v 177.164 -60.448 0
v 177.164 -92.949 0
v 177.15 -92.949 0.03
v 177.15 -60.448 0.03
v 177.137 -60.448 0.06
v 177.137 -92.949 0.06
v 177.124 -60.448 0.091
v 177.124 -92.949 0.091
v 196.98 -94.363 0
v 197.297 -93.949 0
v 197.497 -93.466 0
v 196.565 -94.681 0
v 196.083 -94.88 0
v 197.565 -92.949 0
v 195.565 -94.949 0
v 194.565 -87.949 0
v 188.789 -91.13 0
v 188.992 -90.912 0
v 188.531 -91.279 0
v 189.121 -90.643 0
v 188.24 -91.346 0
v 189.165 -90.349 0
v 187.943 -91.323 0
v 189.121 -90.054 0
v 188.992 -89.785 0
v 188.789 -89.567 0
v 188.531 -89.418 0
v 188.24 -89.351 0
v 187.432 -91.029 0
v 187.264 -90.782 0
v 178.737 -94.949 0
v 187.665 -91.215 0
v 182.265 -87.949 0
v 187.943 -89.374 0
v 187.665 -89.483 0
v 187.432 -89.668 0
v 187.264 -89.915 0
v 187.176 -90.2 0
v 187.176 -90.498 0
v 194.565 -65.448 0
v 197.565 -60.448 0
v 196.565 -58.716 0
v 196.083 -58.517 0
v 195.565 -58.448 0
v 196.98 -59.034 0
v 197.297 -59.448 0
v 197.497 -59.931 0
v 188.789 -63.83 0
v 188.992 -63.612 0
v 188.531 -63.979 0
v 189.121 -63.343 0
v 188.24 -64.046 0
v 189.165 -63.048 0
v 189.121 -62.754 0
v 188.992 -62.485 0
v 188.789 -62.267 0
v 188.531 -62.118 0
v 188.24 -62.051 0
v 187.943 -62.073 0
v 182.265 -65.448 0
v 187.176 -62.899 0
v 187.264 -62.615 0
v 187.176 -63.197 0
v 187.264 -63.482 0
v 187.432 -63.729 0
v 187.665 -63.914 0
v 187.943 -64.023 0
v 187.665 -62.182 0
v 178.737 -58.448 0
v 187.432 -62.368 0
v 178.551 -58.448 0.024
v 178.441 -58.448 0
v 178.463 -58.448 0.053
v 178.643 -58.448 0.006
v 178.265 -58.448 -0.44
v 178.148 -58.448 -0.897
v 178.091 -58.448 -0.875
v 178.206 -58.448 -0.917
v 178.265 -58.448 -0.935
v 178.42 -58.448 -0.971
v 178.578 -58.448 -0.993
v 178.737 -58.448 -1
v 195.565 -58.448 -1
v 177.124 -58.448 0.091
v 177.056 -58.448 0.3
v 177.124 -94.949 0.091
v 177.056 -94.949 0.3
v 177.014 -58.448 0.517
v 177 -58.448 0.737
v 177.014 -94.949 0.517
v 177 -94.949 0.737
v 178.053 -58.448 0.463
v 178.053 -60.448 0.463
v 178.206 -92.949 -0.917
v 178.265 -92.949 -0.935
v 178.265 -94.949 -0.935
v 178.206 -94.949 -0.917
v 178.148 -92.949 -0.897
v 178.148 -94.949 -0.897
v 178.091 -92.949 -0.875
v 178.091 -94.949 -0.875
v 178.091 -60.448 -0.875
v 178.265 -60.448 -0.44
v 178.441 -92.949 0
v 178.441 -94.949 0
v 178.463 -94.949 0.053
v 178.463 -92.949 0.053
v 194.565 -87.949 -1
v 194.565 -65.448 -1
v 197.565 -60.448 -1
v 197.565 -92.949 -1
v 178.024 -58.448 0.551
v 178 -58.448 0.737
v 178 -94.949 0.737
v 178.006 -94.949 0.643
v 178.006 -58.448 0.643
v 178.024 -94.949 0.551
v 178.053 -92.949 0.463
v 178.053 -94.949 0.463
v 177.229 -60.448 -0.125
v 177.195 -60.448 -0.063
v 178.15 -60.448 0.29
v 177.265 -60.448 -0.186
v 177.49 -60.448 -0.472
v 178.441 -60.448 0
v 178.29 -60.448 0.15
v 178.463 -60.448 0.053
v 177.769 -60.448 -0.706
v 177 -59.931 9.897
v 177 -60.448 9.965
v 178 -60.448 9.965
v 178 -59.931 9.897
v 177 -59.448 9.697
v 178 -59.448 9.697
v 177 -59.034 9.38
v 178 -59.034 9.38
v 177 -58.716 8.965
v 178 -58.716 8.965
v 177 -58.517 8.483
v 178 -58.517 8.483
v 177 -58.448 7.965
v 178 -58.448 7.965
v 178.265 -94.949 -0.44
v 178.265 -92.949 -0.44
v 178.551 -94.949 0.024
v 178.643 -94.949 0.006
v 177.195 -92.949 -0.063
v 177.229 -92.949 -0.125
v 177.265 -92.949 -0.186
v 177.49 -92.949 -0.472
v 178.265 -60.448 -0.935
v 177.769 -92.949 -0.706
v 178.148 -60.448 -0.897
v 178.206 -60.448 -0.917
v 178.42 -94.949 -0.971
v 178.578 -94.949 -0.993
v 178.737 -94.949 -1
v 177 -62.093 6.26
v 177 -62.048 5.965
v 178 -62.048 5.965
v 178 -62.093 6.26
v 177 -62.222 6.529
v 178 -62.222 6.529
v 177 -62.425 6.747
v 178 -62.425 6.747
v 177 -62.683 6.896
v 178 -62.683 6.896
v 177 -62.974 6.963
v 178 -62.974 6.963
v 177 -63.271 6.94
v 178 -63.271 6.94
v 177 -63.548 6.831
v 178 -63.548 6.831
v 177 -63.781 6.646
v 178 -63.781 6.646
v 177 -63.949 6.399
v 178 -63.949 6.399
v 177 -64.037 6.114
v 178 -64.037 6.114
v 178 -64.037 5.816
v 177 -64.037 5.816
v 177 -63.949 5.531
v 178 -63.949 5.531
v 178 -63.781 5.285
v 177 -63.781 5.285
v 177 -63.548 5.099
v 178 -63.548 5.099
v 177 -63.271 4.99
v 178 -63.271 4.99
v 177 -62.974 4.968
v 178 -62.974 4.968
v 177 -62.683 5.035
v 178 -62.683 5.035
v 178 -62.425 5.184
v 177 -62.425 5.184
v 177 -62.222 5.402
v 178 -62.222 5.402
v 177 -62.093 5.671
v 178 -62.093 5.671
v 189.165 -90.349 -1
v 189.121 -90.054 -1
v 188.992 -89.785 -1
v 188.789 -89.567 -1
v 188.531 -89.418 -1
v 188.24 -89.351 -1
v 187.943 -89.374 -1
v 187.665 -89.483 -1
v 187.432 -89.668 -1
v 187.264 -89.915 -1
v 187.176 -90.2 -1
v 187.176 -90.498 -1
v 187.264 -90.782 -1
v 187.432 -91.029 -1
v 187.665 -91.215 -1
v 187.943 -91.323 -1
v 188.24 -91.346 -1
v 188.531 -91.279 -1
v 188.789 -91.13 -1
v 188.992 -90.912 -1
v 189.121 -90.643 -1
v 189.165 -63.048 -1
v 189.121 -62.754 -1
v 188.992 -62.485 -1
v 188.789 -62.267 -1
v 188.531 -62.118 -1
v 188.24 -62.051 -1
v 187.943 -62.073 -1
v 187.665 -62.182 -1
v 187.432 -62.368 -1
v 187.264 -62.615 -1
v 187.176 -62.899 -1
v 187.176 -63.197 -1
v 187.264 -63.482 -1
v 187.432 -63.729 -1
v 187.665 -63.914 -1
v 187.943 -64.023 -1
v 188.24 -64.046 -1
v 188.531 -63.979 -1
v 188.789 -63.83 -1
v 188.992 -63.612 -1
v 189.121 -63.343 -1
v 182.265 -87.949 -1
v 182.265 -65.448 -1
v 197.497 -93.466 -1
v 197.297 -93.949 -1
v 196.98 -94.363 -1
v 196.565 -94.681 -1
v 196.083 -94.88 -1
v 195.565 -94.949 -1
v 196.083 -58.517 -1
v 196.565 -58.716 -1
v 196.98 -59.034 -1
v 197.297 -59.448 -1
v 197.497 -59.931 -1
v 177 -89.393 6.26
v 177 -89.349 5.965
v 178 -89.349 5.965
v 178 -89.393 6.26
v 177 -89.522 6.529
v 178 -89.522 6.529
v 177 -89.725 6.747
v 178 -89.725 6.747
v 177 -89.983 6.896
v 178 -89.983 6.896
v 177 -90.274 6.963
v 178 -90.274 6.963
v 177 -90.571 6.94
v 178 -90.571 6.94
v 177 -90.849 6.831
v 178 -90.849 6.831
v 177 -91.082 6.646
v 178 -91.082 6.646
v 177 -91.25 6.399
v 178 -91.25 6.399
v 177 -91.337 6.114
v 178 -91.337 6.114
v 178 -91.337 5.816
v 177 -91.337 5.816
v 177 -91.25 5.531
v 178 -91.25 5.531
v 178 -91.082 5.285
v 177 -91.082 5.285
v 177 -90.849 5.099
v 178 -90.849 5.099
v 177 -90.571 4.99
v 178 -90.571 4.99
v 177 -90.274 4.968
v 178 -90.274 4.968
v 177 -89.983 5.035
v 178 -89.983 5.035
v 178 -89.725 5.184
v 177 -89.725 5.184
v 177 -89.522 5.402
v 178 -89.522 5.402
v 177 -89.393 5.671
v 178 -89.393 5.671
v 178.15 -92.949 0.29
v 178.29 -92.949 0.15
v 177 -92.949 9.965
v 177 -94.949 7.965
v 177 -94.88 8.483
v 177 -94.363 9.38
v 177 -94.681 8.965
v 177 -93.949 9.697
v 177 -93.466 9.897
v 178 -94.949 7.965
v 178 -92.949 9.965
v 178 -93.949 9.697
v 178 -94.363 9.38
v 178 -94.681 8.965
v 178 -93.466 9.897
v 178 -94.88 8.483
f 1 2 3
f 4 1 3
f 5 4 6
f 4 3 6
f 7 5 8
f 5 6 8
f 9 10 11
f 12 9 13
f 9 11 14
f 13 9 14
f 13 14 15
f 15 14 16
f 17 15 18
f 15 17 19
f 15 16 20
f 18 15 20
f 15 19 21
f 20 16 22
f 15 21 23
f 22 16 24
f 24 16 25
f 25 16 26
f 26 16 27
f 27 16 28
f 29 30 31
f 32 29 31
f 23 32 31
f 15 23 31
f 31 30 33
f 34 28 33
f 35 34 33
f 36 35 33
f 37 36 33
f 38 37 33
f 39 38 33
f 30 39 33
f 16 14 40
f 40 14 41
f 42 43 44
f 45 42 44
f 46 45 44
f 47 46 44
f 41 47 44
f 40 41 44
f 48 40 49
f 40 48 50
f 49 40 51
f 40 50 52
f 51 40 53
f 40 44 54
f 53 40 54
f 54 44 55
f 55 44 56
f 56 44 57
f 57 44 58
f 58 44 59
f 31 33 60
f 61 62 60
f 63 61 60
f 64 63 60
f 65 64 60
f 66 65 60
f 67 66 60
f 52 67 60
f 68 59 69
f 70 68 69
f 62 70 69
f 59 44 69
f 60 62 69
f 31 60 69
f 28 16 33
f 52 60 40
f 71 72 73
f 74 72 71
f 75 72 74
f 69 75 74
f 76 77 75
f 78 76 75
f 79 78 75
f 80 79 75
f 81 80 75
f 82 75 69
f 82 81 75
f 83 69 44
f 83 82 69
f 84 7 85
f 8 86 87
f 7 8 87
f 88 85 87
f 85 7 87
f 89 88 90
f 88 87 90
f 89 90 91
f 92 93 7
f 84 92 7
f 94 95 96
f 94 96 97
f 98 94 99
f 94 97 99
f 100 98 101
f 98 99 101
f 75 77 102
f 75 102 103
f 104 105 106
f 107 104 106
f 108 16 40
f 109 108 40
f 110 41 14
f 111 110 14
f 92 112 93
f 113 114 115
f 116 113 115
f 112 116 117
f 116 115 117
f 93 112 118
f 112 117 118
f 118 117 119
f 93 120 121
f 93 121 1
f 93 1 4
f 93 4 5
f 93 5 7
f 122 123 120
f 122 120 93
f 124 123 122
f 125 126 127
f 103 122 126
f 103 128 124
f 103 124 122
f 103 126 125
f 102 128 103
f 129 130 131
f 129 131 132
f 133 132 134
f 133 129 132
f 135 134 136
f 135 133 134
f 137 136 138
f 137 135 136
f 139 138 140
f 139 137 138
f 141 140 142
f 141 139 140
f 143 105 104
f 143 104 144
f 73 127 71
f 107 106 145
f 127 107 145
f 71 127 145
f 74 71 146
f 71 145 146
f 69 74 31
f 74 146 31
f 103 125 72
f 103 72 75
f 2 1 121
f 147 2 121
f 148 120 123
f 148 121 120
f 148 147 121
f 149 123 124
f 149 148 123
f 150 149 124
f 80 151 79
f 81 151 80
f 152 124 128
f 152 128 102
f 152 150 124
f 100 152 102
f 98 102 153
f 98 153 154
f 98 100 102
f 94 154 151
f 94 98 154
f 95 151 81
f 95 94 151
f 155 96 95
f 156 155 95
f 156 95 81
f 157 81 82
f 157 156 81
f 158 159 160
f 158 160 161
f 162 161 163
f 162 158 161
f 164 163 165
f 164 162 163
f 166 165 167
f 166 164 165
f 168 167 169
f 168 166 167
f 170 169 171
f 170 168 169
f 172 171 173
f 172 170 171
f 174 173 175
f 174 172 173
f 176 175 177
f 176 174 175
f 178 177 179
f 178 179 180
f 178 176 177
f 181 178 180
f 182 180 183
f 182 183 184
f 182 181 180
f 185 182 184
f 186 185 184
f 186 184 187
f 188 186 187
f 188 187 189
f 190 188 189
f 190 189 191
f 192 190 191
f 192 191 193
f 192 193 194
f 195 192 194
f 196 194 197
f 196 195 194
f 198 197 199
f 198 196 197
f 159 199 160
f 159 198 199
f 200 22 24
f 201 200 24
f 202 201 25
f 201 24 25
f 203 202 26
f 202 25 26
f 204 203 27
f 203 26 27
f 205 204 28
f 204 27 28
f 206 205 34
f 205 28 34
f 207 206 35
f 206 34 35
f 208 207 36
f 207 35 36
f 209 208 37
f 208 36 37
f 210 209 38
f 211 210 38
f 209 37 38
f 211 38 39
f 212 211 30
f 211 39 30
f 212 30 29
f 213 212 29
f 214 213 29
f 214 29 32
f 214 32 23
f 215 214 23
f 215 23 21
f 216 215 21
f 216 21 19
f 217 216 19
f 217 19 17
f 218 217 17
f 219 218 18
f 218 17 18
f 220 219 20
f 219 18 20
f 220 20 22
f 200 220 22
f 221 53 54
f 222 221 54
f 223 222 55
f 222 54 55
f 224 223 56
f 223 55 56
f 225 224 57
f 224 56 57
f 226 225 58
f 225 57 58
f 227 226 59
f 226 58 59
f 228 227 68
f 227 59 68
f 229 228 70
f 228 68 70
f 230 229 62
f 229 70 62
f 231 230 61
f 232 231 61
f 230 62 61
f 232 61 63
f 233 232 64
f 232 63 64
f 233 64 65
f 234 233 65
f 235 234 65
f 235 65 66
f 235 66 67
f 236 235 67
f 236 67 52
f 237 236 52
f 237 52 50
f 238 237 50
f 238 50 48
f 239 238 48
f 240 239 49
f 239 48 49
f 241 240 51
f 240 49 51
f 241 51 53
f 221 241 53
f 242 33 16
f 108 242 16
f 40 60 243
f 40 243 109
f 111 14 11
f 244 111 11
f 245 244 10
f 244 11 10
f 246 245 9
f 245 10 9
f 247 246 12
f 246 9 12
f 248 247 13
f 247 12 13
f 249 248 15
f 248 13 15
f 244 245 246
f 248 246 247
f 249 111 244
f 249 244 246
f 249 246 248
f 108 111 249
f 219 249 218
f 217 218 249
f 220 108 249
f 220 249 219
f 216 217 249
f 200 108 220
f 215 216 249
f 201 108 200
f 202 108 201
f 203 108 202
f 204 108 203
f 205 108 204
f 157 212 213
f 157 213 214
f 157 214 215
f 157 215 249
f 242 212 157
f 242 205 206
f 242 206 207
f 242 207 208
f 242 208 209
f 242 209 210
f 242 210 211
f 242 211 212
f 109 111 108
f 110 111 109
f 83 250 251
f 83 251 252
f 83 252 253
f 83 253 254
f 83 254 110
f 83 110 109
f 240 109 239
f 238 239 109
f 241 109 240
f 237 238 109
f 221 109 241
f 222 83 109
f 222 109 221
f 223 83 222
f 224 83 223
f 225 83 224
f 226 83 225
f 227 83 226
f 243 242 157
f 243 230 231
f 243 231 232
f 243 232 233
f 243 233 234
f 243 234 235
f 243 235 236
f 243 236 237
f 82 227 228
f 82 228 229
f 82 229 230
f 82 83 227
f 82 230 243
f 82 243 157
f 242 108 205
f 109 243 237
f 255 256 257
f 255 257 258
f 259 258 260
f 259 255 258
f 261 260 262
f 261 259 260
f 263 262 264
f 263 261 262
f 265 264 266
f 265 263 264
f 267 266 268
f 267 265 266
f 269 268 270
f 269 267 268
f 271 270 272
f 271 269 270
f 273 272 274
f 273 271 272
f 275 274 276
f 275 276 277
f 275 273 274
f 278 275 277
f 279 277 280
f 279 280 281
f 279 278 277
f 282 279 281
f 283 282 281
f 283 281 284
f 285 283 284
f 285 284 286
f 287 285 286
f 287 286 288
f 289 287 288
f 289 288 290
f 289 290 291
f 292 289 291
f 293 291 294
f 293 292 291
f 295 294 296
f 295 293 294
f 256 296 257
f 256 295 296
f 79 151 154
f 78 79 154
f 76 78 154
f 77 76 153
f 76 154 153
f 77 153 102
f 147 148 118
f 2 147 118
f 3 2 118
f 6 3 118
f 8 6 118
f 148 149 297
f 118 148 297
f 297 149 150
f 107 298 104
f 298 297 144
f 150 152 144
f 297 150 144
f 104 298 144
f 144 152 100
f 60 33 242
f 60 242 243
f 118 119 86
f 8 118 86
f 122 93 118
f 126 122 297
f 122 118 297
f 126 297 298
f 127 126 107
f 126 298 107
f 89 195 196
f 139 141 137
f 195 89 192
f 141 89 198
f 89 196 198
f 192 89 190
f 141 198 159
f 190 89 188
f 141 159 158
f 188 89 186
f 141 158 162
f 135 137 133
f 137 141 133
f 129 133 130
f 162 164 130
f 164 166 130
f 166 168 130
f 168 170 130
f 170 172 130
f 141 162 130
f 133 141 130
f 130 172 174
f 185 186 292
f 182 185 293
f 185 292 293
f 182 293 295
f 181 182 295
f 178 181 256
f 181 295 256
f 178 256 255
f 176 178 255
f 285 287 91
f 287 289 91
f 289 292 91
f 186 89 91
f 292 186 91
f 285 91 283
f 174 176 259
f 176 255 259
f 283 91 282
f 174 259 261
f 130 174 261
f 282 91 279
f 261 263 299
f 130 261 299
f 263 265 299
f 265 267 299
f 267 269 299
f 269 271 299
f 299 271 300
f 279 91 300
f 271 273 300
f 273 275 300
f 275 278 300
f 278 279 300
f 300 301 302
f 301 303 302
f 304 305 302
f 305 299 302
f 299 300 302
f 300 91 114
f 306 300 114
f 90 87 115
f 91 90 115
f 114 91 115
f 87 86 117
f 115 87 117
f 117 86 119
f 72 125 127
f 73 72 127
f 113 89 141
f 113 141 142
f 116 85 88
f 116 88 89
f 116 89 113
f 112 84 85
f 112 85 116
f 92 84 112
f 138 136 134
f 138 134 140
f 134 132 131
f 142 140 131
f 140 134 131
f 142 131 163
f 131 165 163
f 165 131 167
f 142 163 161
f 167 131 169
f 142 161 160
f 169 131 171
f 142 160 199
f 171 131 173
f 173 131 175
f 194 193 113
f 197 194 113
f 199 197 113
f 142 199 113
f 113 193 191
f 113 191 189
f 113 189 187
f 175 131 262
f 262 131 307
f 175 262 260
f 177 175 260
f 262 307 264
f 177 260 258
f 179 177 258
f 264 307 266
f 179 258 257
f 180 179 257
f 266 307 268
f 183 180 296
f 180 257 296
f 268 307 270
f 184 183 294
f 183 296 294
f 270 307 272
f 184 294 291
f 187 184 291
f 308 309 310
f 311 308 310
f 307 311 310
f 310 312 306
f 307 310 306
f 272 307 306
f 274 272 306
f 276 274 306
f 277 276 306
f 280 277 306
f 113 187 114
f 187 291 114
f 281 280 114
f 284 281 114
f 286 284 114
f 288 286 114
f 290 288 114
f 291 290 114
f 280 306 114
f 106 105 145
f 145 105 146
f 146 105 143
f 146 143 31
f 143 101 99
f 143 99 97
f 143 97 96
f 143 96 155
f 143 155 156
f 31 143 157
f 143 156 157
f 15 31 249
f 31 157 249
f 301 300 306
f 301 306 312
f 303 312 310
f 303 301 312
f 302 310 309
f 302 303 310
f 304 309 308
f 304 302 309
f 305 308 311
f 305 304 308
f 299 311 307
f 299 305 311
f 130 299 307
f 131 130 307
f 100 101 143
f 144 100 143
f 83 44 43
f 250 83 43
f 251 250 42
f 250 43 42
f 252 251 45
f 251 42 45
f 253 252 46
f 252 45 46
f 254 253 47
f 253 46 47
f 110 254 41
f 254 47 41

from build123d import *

# Parameters (mm, degrees)
MODEL_R                         = 1
MODEL_W                         = 12.3
MODEL_H                         = 22.500175579
BRIDA_BASE1_DEPTH               = 1
PLIEGUE_START                   = -94.948568727
PLIEGUE_CROQUIZADO1_DEPTH       = 36.500175579
PLIEGUE_CROQUIZADO1_2_DEPTH     = 2
PLIEGUE_START_2                 = -60.448393148
PLIEGUE_CROQUIZADO1_3_DEPTH     = 2
PLIEGUE_CROQUIZADO1_4_DEPTH     = 36.500175579
PLIEGUE_START_3                 = -92.948568727
PLIEGUE_CROQUIZADO1_5_DEPTH     = 32.500175579
PLIEGUE_START_4                 = 176.99991226
PLIEGUE_CROQUIZADO1_6_OUTLINE_R = 1
PLIEGUE_CROQUIZADO1_6_DEPTH     = 1


with BuildPart() as part:
    # Brida base1: sheet metal written as solids
    # Model → Brida base1 (new body)
    with BuildSketch(Plane.XY):
        with BuildLine():
            Line((178.265288891, -94.948568727), (178.265288891, -92.948568727))
            Line((178.265288891, -92.948568727), (177.265288891, -92.948568727))
            Line((177.265288891, -92.948568727), (177.265288891, -94.948568727))
            Line((177.265288891, -94.948568727), (169.565288891, -94.948568727))
            ThreePointArc((169.565288891, -94.948568727), (168.151075328, -94.362782289), (167.565288891, -92.948568727))
            Line((167.565288891, -92.948568727), (167.565288891, -60.448393148))
            ThreePointArc((167.565288891, -60.448393148), (168.151075328, -59.034179585), (169.565288891, -58.448393148))
            Line((169.565288891, -58.448393148), (177.265288891, -58.448393148))
            Line((177.265288891, -58.448393148), (177.265288891, -60.448393148))
            Line((177.265288891, -60.448393148), (178.265288891, -60.448393148))
            Line((178.265288891, -60.448393148), (178.265288891, -58.448393148))
            Line((178.265288891, -58.448393148), (195.565288891, -58.448393148))
            ThreePointArc((195.565288891, -58.448393148), (196.979502453, -59.034179585), (197.565288891, -60.448393148))
            Line((197.565288891, -60.448393148), (197.565288891, -92.948568727))
            ThreePointArc((197.565288891, -92.948568727), (196.979502453, -94.362782289), (195.565288891, -94.948568727))
            Line((195.565288891, -94.948568727), (178.265288891, -94.948568727))
        make_face()
        with Locations((171.565288891, -90.348568727)):
            Circle(MODEL_R, mode=Mode.SUBTRACT)
        with Locations((171.565288891, -63.048393148)):
            Circle(MODEL_R, mode=Mode.SUBTRACT)
        with Locations((188.165288891, -63.048393148)):
            Circle(MODEL_R, mode=Mode.SUBTRACT)
        with Locations((188.165288891, -90.348568727)):
            Circle(MODEL_R, mode=Mode.SUBTRACT)
        with Locations((188.415288891, -76.698480938)):
            Rectangle(MODEL_W, MODEL_H, mode=Mode.SUBTRACT)
    extrude(amount=-BRIDA_BASE1_DEPTH)

    # Pliegue croquizado1: read off the stored shape, not the designer's step
    # Pliegue croquizado1 outline → Pliegue croquizado1 (cut)
    with BuildSketch(Plane(origin=(0, 0, 0), x_dir=(1, 0, 0), z_dir=(0, 1, 0)).offset(PLIEGUE_START)):
        with BuildLine():
            Line((167.565288891, 0), (177.163871169, 0))
            ThreePointArc((177.163871169, 0), (177.804686096, 0.728828115), (178.73651226, 1))
            Line((178.73651226, 1), (167.565288891, 1))
            Line((167.565288891, 1), (167.565288891, 0))
        make_face()
    extrude(amount=PLIEGUE_CROQUIZADO1_DEPTH, mode=Mode.SUBTRACT)

    # Pliegue croquizado1 2 outline → Pliegue croquizado1 2 (cut)
    with BuildSketch(Plane(origin=(0, 0, 0), x_dir=(1, 0, 0), z_dir=(0, 1, 0)).offset(PLIEGUE_START)):
        with BuildLine():
            ThreePointArc((177.265288891, 0.186049099), (177.211739726, 0.094572835), (177.163871169, 0))
            Line((177.163871169, 0), (177.265288891, 0))
            Line((177.265288891, 0), (177.265288891, 0.186049099))
        make_face()
        Polygon((178.265288891, 0), (178.441395947, 0), (178.265288891, 0.439557056), align=None)
    extrude(amount=PLIEGUE_CROQUIZADO1_2_DEPTH, mode=Mode.SUBTRACT)

    # Pliegue croquizado1 3 outline → Pliegue croquizado1 3 (cut)
    with BuildSketch(Plane(origin=(0, 0, 0), x_dir=(1, 0, 0), z_dir=(0, 1, 0)).offset(PLIEGUE_START_2)):
        with BuildLine():
            ThreePointArc((177.265288891, 0.186049099), (177.211739726, 0.094572835), (177.163871169, 0))
            Line((177.163871169, 0), (177.265288891, 0))
            Line((177.265288891, 0), (177.265288891, 0.186049099))
        make_face()
        Polygon((178.265288891, 0), (178.441395947, 0), (178.265288891, 0.439557056), align=None)
    extrude(amount=PLIEGUE_CROQUIZADO1_3_DEPTH, mode=Mode.SUBTRACT)

    # Pliegue croquizado1 4 outline → Pliegue croquizado1 4 (add)
    with BuildSketch(Plane(origin=(0, 0, 0), x_dir=(1, 0, 0), z_dir=(0, 1, 0)).offset(PLIEGUE_START)):
        with BuildLine():
            Line((176.99991226, -9.965376631), (177.99991226, -9.965376631))
            Line((177.99991226, -9.965376631), (177.99991226, -0.7366))
            ThreePointArc((177.99991226, -0.7366), (178.01324203, -0.597101848), (178.0527489, -0.46265251))
            Line((178.0527489, -0.46265251), (177.124479337, -0.090744432))
            ThreePointArc((177.124479337, -0.090744432), (177.031338378, -0.407720702), (176.99991226, -0.7366))
            Line((176.99991226, -0.7366), (176.99991226, -9.965376631))
        make_face()
        with BuildLine():
            Line((178.441395947, 0), (178.462564769, -0.05283664))
            ThreePointArc((178.462564769, -0.05283664), (178.597014107, -0.01332977), (178.73651226, 0))
            Line((178.73651226, 0), (178.441395947, 0))
        make_face()
        with BuildLine():
            Line((178.090656691, 0.875432923), (178.265288891, 0.439557056))
            Line((178.265288891, 0.439557056), (178.265288891, 0.934844913))
            ThreePointArc((178.265288891, 0.934844913), (178.17718339, 0.907459237), (178.090656691, 0.875432923))
        make_face()
    extrude(amount=PLIEGUE_CROQUIZADO1_4_DEPTH)

    # Pliegue croquizado1 5 outline → Pliegue croquizado1 5 (add)
    with BuildSketch(Plane(origin=(0, 0, 0), x_dir=(1, 0, 0), z_dir=(0, 1, 0)).offset(PLIEGUE_START_3)):
        with BuildLine():
            Line((177.124479337, -0.090744432), (178.0527489, -0.46265251))
            ThreePointArc((178.0527489, -0.46265251), (178.215657405, -0.215745145), (178.462564769, -0.05283664))
            Line((178.462564769, -0.05283664), (178.441395947, 0))
            Line((178.441395947, 0), (177.163871169, 0))
            ThreePointArc((177.163871169, 0), (177.143528964, -0.045091664), (177.124479337, -0.090744432))
        make_face()
    extrude(amount=PLIEGUE_CROQUIZADO1_5_DEPTH)

    # Pliegue croquizado1 6 outline → Pliegue croquizado1 6 (cut)
    with BuildSketch(Plane.YZ.offset(PLIEGUE_START_4)):
        with BuildLine():
            Line((-58.448393148, 9.965376631), (-60.448393148, 9.965376631))
            ThreePointArc((-60.448393148, 9.965376631), (-59.034179585, 9.379590194), (-58.448393148, 7.965376631))
            Line((-58.448393148, 7.965376631), (-58.448393148, 9.965376631))
        make_face()
        with BuildLine():
            ThreePointArc((-94.948568727, 7.965376631), (-94.362782289, 9.379590194), (-92.948568727, 9.965376631))
            Line((-92.948568727, 9.965376631), (-94.948568727, 9.965376631))
            Line((-94.948568727, 9.965376631), (-94.948568727, 7.965376631))
        make_face()
        with Locations((-90.348568727, 5.965376631)):
            Circle(PLIEGUE_CROQUIZADO1_6_OUTLINE_R)
        with Locations((-63.048393148, 5.965376631)):
            Circle(PLIEGUE_CROQUIZADO1_6_OUTLINE_R)
    extrude(amount=PLIEGUE_CROQUIZADO1_6_DEPTH, mode=Mode.SUBTRACT)


solid = part.part
